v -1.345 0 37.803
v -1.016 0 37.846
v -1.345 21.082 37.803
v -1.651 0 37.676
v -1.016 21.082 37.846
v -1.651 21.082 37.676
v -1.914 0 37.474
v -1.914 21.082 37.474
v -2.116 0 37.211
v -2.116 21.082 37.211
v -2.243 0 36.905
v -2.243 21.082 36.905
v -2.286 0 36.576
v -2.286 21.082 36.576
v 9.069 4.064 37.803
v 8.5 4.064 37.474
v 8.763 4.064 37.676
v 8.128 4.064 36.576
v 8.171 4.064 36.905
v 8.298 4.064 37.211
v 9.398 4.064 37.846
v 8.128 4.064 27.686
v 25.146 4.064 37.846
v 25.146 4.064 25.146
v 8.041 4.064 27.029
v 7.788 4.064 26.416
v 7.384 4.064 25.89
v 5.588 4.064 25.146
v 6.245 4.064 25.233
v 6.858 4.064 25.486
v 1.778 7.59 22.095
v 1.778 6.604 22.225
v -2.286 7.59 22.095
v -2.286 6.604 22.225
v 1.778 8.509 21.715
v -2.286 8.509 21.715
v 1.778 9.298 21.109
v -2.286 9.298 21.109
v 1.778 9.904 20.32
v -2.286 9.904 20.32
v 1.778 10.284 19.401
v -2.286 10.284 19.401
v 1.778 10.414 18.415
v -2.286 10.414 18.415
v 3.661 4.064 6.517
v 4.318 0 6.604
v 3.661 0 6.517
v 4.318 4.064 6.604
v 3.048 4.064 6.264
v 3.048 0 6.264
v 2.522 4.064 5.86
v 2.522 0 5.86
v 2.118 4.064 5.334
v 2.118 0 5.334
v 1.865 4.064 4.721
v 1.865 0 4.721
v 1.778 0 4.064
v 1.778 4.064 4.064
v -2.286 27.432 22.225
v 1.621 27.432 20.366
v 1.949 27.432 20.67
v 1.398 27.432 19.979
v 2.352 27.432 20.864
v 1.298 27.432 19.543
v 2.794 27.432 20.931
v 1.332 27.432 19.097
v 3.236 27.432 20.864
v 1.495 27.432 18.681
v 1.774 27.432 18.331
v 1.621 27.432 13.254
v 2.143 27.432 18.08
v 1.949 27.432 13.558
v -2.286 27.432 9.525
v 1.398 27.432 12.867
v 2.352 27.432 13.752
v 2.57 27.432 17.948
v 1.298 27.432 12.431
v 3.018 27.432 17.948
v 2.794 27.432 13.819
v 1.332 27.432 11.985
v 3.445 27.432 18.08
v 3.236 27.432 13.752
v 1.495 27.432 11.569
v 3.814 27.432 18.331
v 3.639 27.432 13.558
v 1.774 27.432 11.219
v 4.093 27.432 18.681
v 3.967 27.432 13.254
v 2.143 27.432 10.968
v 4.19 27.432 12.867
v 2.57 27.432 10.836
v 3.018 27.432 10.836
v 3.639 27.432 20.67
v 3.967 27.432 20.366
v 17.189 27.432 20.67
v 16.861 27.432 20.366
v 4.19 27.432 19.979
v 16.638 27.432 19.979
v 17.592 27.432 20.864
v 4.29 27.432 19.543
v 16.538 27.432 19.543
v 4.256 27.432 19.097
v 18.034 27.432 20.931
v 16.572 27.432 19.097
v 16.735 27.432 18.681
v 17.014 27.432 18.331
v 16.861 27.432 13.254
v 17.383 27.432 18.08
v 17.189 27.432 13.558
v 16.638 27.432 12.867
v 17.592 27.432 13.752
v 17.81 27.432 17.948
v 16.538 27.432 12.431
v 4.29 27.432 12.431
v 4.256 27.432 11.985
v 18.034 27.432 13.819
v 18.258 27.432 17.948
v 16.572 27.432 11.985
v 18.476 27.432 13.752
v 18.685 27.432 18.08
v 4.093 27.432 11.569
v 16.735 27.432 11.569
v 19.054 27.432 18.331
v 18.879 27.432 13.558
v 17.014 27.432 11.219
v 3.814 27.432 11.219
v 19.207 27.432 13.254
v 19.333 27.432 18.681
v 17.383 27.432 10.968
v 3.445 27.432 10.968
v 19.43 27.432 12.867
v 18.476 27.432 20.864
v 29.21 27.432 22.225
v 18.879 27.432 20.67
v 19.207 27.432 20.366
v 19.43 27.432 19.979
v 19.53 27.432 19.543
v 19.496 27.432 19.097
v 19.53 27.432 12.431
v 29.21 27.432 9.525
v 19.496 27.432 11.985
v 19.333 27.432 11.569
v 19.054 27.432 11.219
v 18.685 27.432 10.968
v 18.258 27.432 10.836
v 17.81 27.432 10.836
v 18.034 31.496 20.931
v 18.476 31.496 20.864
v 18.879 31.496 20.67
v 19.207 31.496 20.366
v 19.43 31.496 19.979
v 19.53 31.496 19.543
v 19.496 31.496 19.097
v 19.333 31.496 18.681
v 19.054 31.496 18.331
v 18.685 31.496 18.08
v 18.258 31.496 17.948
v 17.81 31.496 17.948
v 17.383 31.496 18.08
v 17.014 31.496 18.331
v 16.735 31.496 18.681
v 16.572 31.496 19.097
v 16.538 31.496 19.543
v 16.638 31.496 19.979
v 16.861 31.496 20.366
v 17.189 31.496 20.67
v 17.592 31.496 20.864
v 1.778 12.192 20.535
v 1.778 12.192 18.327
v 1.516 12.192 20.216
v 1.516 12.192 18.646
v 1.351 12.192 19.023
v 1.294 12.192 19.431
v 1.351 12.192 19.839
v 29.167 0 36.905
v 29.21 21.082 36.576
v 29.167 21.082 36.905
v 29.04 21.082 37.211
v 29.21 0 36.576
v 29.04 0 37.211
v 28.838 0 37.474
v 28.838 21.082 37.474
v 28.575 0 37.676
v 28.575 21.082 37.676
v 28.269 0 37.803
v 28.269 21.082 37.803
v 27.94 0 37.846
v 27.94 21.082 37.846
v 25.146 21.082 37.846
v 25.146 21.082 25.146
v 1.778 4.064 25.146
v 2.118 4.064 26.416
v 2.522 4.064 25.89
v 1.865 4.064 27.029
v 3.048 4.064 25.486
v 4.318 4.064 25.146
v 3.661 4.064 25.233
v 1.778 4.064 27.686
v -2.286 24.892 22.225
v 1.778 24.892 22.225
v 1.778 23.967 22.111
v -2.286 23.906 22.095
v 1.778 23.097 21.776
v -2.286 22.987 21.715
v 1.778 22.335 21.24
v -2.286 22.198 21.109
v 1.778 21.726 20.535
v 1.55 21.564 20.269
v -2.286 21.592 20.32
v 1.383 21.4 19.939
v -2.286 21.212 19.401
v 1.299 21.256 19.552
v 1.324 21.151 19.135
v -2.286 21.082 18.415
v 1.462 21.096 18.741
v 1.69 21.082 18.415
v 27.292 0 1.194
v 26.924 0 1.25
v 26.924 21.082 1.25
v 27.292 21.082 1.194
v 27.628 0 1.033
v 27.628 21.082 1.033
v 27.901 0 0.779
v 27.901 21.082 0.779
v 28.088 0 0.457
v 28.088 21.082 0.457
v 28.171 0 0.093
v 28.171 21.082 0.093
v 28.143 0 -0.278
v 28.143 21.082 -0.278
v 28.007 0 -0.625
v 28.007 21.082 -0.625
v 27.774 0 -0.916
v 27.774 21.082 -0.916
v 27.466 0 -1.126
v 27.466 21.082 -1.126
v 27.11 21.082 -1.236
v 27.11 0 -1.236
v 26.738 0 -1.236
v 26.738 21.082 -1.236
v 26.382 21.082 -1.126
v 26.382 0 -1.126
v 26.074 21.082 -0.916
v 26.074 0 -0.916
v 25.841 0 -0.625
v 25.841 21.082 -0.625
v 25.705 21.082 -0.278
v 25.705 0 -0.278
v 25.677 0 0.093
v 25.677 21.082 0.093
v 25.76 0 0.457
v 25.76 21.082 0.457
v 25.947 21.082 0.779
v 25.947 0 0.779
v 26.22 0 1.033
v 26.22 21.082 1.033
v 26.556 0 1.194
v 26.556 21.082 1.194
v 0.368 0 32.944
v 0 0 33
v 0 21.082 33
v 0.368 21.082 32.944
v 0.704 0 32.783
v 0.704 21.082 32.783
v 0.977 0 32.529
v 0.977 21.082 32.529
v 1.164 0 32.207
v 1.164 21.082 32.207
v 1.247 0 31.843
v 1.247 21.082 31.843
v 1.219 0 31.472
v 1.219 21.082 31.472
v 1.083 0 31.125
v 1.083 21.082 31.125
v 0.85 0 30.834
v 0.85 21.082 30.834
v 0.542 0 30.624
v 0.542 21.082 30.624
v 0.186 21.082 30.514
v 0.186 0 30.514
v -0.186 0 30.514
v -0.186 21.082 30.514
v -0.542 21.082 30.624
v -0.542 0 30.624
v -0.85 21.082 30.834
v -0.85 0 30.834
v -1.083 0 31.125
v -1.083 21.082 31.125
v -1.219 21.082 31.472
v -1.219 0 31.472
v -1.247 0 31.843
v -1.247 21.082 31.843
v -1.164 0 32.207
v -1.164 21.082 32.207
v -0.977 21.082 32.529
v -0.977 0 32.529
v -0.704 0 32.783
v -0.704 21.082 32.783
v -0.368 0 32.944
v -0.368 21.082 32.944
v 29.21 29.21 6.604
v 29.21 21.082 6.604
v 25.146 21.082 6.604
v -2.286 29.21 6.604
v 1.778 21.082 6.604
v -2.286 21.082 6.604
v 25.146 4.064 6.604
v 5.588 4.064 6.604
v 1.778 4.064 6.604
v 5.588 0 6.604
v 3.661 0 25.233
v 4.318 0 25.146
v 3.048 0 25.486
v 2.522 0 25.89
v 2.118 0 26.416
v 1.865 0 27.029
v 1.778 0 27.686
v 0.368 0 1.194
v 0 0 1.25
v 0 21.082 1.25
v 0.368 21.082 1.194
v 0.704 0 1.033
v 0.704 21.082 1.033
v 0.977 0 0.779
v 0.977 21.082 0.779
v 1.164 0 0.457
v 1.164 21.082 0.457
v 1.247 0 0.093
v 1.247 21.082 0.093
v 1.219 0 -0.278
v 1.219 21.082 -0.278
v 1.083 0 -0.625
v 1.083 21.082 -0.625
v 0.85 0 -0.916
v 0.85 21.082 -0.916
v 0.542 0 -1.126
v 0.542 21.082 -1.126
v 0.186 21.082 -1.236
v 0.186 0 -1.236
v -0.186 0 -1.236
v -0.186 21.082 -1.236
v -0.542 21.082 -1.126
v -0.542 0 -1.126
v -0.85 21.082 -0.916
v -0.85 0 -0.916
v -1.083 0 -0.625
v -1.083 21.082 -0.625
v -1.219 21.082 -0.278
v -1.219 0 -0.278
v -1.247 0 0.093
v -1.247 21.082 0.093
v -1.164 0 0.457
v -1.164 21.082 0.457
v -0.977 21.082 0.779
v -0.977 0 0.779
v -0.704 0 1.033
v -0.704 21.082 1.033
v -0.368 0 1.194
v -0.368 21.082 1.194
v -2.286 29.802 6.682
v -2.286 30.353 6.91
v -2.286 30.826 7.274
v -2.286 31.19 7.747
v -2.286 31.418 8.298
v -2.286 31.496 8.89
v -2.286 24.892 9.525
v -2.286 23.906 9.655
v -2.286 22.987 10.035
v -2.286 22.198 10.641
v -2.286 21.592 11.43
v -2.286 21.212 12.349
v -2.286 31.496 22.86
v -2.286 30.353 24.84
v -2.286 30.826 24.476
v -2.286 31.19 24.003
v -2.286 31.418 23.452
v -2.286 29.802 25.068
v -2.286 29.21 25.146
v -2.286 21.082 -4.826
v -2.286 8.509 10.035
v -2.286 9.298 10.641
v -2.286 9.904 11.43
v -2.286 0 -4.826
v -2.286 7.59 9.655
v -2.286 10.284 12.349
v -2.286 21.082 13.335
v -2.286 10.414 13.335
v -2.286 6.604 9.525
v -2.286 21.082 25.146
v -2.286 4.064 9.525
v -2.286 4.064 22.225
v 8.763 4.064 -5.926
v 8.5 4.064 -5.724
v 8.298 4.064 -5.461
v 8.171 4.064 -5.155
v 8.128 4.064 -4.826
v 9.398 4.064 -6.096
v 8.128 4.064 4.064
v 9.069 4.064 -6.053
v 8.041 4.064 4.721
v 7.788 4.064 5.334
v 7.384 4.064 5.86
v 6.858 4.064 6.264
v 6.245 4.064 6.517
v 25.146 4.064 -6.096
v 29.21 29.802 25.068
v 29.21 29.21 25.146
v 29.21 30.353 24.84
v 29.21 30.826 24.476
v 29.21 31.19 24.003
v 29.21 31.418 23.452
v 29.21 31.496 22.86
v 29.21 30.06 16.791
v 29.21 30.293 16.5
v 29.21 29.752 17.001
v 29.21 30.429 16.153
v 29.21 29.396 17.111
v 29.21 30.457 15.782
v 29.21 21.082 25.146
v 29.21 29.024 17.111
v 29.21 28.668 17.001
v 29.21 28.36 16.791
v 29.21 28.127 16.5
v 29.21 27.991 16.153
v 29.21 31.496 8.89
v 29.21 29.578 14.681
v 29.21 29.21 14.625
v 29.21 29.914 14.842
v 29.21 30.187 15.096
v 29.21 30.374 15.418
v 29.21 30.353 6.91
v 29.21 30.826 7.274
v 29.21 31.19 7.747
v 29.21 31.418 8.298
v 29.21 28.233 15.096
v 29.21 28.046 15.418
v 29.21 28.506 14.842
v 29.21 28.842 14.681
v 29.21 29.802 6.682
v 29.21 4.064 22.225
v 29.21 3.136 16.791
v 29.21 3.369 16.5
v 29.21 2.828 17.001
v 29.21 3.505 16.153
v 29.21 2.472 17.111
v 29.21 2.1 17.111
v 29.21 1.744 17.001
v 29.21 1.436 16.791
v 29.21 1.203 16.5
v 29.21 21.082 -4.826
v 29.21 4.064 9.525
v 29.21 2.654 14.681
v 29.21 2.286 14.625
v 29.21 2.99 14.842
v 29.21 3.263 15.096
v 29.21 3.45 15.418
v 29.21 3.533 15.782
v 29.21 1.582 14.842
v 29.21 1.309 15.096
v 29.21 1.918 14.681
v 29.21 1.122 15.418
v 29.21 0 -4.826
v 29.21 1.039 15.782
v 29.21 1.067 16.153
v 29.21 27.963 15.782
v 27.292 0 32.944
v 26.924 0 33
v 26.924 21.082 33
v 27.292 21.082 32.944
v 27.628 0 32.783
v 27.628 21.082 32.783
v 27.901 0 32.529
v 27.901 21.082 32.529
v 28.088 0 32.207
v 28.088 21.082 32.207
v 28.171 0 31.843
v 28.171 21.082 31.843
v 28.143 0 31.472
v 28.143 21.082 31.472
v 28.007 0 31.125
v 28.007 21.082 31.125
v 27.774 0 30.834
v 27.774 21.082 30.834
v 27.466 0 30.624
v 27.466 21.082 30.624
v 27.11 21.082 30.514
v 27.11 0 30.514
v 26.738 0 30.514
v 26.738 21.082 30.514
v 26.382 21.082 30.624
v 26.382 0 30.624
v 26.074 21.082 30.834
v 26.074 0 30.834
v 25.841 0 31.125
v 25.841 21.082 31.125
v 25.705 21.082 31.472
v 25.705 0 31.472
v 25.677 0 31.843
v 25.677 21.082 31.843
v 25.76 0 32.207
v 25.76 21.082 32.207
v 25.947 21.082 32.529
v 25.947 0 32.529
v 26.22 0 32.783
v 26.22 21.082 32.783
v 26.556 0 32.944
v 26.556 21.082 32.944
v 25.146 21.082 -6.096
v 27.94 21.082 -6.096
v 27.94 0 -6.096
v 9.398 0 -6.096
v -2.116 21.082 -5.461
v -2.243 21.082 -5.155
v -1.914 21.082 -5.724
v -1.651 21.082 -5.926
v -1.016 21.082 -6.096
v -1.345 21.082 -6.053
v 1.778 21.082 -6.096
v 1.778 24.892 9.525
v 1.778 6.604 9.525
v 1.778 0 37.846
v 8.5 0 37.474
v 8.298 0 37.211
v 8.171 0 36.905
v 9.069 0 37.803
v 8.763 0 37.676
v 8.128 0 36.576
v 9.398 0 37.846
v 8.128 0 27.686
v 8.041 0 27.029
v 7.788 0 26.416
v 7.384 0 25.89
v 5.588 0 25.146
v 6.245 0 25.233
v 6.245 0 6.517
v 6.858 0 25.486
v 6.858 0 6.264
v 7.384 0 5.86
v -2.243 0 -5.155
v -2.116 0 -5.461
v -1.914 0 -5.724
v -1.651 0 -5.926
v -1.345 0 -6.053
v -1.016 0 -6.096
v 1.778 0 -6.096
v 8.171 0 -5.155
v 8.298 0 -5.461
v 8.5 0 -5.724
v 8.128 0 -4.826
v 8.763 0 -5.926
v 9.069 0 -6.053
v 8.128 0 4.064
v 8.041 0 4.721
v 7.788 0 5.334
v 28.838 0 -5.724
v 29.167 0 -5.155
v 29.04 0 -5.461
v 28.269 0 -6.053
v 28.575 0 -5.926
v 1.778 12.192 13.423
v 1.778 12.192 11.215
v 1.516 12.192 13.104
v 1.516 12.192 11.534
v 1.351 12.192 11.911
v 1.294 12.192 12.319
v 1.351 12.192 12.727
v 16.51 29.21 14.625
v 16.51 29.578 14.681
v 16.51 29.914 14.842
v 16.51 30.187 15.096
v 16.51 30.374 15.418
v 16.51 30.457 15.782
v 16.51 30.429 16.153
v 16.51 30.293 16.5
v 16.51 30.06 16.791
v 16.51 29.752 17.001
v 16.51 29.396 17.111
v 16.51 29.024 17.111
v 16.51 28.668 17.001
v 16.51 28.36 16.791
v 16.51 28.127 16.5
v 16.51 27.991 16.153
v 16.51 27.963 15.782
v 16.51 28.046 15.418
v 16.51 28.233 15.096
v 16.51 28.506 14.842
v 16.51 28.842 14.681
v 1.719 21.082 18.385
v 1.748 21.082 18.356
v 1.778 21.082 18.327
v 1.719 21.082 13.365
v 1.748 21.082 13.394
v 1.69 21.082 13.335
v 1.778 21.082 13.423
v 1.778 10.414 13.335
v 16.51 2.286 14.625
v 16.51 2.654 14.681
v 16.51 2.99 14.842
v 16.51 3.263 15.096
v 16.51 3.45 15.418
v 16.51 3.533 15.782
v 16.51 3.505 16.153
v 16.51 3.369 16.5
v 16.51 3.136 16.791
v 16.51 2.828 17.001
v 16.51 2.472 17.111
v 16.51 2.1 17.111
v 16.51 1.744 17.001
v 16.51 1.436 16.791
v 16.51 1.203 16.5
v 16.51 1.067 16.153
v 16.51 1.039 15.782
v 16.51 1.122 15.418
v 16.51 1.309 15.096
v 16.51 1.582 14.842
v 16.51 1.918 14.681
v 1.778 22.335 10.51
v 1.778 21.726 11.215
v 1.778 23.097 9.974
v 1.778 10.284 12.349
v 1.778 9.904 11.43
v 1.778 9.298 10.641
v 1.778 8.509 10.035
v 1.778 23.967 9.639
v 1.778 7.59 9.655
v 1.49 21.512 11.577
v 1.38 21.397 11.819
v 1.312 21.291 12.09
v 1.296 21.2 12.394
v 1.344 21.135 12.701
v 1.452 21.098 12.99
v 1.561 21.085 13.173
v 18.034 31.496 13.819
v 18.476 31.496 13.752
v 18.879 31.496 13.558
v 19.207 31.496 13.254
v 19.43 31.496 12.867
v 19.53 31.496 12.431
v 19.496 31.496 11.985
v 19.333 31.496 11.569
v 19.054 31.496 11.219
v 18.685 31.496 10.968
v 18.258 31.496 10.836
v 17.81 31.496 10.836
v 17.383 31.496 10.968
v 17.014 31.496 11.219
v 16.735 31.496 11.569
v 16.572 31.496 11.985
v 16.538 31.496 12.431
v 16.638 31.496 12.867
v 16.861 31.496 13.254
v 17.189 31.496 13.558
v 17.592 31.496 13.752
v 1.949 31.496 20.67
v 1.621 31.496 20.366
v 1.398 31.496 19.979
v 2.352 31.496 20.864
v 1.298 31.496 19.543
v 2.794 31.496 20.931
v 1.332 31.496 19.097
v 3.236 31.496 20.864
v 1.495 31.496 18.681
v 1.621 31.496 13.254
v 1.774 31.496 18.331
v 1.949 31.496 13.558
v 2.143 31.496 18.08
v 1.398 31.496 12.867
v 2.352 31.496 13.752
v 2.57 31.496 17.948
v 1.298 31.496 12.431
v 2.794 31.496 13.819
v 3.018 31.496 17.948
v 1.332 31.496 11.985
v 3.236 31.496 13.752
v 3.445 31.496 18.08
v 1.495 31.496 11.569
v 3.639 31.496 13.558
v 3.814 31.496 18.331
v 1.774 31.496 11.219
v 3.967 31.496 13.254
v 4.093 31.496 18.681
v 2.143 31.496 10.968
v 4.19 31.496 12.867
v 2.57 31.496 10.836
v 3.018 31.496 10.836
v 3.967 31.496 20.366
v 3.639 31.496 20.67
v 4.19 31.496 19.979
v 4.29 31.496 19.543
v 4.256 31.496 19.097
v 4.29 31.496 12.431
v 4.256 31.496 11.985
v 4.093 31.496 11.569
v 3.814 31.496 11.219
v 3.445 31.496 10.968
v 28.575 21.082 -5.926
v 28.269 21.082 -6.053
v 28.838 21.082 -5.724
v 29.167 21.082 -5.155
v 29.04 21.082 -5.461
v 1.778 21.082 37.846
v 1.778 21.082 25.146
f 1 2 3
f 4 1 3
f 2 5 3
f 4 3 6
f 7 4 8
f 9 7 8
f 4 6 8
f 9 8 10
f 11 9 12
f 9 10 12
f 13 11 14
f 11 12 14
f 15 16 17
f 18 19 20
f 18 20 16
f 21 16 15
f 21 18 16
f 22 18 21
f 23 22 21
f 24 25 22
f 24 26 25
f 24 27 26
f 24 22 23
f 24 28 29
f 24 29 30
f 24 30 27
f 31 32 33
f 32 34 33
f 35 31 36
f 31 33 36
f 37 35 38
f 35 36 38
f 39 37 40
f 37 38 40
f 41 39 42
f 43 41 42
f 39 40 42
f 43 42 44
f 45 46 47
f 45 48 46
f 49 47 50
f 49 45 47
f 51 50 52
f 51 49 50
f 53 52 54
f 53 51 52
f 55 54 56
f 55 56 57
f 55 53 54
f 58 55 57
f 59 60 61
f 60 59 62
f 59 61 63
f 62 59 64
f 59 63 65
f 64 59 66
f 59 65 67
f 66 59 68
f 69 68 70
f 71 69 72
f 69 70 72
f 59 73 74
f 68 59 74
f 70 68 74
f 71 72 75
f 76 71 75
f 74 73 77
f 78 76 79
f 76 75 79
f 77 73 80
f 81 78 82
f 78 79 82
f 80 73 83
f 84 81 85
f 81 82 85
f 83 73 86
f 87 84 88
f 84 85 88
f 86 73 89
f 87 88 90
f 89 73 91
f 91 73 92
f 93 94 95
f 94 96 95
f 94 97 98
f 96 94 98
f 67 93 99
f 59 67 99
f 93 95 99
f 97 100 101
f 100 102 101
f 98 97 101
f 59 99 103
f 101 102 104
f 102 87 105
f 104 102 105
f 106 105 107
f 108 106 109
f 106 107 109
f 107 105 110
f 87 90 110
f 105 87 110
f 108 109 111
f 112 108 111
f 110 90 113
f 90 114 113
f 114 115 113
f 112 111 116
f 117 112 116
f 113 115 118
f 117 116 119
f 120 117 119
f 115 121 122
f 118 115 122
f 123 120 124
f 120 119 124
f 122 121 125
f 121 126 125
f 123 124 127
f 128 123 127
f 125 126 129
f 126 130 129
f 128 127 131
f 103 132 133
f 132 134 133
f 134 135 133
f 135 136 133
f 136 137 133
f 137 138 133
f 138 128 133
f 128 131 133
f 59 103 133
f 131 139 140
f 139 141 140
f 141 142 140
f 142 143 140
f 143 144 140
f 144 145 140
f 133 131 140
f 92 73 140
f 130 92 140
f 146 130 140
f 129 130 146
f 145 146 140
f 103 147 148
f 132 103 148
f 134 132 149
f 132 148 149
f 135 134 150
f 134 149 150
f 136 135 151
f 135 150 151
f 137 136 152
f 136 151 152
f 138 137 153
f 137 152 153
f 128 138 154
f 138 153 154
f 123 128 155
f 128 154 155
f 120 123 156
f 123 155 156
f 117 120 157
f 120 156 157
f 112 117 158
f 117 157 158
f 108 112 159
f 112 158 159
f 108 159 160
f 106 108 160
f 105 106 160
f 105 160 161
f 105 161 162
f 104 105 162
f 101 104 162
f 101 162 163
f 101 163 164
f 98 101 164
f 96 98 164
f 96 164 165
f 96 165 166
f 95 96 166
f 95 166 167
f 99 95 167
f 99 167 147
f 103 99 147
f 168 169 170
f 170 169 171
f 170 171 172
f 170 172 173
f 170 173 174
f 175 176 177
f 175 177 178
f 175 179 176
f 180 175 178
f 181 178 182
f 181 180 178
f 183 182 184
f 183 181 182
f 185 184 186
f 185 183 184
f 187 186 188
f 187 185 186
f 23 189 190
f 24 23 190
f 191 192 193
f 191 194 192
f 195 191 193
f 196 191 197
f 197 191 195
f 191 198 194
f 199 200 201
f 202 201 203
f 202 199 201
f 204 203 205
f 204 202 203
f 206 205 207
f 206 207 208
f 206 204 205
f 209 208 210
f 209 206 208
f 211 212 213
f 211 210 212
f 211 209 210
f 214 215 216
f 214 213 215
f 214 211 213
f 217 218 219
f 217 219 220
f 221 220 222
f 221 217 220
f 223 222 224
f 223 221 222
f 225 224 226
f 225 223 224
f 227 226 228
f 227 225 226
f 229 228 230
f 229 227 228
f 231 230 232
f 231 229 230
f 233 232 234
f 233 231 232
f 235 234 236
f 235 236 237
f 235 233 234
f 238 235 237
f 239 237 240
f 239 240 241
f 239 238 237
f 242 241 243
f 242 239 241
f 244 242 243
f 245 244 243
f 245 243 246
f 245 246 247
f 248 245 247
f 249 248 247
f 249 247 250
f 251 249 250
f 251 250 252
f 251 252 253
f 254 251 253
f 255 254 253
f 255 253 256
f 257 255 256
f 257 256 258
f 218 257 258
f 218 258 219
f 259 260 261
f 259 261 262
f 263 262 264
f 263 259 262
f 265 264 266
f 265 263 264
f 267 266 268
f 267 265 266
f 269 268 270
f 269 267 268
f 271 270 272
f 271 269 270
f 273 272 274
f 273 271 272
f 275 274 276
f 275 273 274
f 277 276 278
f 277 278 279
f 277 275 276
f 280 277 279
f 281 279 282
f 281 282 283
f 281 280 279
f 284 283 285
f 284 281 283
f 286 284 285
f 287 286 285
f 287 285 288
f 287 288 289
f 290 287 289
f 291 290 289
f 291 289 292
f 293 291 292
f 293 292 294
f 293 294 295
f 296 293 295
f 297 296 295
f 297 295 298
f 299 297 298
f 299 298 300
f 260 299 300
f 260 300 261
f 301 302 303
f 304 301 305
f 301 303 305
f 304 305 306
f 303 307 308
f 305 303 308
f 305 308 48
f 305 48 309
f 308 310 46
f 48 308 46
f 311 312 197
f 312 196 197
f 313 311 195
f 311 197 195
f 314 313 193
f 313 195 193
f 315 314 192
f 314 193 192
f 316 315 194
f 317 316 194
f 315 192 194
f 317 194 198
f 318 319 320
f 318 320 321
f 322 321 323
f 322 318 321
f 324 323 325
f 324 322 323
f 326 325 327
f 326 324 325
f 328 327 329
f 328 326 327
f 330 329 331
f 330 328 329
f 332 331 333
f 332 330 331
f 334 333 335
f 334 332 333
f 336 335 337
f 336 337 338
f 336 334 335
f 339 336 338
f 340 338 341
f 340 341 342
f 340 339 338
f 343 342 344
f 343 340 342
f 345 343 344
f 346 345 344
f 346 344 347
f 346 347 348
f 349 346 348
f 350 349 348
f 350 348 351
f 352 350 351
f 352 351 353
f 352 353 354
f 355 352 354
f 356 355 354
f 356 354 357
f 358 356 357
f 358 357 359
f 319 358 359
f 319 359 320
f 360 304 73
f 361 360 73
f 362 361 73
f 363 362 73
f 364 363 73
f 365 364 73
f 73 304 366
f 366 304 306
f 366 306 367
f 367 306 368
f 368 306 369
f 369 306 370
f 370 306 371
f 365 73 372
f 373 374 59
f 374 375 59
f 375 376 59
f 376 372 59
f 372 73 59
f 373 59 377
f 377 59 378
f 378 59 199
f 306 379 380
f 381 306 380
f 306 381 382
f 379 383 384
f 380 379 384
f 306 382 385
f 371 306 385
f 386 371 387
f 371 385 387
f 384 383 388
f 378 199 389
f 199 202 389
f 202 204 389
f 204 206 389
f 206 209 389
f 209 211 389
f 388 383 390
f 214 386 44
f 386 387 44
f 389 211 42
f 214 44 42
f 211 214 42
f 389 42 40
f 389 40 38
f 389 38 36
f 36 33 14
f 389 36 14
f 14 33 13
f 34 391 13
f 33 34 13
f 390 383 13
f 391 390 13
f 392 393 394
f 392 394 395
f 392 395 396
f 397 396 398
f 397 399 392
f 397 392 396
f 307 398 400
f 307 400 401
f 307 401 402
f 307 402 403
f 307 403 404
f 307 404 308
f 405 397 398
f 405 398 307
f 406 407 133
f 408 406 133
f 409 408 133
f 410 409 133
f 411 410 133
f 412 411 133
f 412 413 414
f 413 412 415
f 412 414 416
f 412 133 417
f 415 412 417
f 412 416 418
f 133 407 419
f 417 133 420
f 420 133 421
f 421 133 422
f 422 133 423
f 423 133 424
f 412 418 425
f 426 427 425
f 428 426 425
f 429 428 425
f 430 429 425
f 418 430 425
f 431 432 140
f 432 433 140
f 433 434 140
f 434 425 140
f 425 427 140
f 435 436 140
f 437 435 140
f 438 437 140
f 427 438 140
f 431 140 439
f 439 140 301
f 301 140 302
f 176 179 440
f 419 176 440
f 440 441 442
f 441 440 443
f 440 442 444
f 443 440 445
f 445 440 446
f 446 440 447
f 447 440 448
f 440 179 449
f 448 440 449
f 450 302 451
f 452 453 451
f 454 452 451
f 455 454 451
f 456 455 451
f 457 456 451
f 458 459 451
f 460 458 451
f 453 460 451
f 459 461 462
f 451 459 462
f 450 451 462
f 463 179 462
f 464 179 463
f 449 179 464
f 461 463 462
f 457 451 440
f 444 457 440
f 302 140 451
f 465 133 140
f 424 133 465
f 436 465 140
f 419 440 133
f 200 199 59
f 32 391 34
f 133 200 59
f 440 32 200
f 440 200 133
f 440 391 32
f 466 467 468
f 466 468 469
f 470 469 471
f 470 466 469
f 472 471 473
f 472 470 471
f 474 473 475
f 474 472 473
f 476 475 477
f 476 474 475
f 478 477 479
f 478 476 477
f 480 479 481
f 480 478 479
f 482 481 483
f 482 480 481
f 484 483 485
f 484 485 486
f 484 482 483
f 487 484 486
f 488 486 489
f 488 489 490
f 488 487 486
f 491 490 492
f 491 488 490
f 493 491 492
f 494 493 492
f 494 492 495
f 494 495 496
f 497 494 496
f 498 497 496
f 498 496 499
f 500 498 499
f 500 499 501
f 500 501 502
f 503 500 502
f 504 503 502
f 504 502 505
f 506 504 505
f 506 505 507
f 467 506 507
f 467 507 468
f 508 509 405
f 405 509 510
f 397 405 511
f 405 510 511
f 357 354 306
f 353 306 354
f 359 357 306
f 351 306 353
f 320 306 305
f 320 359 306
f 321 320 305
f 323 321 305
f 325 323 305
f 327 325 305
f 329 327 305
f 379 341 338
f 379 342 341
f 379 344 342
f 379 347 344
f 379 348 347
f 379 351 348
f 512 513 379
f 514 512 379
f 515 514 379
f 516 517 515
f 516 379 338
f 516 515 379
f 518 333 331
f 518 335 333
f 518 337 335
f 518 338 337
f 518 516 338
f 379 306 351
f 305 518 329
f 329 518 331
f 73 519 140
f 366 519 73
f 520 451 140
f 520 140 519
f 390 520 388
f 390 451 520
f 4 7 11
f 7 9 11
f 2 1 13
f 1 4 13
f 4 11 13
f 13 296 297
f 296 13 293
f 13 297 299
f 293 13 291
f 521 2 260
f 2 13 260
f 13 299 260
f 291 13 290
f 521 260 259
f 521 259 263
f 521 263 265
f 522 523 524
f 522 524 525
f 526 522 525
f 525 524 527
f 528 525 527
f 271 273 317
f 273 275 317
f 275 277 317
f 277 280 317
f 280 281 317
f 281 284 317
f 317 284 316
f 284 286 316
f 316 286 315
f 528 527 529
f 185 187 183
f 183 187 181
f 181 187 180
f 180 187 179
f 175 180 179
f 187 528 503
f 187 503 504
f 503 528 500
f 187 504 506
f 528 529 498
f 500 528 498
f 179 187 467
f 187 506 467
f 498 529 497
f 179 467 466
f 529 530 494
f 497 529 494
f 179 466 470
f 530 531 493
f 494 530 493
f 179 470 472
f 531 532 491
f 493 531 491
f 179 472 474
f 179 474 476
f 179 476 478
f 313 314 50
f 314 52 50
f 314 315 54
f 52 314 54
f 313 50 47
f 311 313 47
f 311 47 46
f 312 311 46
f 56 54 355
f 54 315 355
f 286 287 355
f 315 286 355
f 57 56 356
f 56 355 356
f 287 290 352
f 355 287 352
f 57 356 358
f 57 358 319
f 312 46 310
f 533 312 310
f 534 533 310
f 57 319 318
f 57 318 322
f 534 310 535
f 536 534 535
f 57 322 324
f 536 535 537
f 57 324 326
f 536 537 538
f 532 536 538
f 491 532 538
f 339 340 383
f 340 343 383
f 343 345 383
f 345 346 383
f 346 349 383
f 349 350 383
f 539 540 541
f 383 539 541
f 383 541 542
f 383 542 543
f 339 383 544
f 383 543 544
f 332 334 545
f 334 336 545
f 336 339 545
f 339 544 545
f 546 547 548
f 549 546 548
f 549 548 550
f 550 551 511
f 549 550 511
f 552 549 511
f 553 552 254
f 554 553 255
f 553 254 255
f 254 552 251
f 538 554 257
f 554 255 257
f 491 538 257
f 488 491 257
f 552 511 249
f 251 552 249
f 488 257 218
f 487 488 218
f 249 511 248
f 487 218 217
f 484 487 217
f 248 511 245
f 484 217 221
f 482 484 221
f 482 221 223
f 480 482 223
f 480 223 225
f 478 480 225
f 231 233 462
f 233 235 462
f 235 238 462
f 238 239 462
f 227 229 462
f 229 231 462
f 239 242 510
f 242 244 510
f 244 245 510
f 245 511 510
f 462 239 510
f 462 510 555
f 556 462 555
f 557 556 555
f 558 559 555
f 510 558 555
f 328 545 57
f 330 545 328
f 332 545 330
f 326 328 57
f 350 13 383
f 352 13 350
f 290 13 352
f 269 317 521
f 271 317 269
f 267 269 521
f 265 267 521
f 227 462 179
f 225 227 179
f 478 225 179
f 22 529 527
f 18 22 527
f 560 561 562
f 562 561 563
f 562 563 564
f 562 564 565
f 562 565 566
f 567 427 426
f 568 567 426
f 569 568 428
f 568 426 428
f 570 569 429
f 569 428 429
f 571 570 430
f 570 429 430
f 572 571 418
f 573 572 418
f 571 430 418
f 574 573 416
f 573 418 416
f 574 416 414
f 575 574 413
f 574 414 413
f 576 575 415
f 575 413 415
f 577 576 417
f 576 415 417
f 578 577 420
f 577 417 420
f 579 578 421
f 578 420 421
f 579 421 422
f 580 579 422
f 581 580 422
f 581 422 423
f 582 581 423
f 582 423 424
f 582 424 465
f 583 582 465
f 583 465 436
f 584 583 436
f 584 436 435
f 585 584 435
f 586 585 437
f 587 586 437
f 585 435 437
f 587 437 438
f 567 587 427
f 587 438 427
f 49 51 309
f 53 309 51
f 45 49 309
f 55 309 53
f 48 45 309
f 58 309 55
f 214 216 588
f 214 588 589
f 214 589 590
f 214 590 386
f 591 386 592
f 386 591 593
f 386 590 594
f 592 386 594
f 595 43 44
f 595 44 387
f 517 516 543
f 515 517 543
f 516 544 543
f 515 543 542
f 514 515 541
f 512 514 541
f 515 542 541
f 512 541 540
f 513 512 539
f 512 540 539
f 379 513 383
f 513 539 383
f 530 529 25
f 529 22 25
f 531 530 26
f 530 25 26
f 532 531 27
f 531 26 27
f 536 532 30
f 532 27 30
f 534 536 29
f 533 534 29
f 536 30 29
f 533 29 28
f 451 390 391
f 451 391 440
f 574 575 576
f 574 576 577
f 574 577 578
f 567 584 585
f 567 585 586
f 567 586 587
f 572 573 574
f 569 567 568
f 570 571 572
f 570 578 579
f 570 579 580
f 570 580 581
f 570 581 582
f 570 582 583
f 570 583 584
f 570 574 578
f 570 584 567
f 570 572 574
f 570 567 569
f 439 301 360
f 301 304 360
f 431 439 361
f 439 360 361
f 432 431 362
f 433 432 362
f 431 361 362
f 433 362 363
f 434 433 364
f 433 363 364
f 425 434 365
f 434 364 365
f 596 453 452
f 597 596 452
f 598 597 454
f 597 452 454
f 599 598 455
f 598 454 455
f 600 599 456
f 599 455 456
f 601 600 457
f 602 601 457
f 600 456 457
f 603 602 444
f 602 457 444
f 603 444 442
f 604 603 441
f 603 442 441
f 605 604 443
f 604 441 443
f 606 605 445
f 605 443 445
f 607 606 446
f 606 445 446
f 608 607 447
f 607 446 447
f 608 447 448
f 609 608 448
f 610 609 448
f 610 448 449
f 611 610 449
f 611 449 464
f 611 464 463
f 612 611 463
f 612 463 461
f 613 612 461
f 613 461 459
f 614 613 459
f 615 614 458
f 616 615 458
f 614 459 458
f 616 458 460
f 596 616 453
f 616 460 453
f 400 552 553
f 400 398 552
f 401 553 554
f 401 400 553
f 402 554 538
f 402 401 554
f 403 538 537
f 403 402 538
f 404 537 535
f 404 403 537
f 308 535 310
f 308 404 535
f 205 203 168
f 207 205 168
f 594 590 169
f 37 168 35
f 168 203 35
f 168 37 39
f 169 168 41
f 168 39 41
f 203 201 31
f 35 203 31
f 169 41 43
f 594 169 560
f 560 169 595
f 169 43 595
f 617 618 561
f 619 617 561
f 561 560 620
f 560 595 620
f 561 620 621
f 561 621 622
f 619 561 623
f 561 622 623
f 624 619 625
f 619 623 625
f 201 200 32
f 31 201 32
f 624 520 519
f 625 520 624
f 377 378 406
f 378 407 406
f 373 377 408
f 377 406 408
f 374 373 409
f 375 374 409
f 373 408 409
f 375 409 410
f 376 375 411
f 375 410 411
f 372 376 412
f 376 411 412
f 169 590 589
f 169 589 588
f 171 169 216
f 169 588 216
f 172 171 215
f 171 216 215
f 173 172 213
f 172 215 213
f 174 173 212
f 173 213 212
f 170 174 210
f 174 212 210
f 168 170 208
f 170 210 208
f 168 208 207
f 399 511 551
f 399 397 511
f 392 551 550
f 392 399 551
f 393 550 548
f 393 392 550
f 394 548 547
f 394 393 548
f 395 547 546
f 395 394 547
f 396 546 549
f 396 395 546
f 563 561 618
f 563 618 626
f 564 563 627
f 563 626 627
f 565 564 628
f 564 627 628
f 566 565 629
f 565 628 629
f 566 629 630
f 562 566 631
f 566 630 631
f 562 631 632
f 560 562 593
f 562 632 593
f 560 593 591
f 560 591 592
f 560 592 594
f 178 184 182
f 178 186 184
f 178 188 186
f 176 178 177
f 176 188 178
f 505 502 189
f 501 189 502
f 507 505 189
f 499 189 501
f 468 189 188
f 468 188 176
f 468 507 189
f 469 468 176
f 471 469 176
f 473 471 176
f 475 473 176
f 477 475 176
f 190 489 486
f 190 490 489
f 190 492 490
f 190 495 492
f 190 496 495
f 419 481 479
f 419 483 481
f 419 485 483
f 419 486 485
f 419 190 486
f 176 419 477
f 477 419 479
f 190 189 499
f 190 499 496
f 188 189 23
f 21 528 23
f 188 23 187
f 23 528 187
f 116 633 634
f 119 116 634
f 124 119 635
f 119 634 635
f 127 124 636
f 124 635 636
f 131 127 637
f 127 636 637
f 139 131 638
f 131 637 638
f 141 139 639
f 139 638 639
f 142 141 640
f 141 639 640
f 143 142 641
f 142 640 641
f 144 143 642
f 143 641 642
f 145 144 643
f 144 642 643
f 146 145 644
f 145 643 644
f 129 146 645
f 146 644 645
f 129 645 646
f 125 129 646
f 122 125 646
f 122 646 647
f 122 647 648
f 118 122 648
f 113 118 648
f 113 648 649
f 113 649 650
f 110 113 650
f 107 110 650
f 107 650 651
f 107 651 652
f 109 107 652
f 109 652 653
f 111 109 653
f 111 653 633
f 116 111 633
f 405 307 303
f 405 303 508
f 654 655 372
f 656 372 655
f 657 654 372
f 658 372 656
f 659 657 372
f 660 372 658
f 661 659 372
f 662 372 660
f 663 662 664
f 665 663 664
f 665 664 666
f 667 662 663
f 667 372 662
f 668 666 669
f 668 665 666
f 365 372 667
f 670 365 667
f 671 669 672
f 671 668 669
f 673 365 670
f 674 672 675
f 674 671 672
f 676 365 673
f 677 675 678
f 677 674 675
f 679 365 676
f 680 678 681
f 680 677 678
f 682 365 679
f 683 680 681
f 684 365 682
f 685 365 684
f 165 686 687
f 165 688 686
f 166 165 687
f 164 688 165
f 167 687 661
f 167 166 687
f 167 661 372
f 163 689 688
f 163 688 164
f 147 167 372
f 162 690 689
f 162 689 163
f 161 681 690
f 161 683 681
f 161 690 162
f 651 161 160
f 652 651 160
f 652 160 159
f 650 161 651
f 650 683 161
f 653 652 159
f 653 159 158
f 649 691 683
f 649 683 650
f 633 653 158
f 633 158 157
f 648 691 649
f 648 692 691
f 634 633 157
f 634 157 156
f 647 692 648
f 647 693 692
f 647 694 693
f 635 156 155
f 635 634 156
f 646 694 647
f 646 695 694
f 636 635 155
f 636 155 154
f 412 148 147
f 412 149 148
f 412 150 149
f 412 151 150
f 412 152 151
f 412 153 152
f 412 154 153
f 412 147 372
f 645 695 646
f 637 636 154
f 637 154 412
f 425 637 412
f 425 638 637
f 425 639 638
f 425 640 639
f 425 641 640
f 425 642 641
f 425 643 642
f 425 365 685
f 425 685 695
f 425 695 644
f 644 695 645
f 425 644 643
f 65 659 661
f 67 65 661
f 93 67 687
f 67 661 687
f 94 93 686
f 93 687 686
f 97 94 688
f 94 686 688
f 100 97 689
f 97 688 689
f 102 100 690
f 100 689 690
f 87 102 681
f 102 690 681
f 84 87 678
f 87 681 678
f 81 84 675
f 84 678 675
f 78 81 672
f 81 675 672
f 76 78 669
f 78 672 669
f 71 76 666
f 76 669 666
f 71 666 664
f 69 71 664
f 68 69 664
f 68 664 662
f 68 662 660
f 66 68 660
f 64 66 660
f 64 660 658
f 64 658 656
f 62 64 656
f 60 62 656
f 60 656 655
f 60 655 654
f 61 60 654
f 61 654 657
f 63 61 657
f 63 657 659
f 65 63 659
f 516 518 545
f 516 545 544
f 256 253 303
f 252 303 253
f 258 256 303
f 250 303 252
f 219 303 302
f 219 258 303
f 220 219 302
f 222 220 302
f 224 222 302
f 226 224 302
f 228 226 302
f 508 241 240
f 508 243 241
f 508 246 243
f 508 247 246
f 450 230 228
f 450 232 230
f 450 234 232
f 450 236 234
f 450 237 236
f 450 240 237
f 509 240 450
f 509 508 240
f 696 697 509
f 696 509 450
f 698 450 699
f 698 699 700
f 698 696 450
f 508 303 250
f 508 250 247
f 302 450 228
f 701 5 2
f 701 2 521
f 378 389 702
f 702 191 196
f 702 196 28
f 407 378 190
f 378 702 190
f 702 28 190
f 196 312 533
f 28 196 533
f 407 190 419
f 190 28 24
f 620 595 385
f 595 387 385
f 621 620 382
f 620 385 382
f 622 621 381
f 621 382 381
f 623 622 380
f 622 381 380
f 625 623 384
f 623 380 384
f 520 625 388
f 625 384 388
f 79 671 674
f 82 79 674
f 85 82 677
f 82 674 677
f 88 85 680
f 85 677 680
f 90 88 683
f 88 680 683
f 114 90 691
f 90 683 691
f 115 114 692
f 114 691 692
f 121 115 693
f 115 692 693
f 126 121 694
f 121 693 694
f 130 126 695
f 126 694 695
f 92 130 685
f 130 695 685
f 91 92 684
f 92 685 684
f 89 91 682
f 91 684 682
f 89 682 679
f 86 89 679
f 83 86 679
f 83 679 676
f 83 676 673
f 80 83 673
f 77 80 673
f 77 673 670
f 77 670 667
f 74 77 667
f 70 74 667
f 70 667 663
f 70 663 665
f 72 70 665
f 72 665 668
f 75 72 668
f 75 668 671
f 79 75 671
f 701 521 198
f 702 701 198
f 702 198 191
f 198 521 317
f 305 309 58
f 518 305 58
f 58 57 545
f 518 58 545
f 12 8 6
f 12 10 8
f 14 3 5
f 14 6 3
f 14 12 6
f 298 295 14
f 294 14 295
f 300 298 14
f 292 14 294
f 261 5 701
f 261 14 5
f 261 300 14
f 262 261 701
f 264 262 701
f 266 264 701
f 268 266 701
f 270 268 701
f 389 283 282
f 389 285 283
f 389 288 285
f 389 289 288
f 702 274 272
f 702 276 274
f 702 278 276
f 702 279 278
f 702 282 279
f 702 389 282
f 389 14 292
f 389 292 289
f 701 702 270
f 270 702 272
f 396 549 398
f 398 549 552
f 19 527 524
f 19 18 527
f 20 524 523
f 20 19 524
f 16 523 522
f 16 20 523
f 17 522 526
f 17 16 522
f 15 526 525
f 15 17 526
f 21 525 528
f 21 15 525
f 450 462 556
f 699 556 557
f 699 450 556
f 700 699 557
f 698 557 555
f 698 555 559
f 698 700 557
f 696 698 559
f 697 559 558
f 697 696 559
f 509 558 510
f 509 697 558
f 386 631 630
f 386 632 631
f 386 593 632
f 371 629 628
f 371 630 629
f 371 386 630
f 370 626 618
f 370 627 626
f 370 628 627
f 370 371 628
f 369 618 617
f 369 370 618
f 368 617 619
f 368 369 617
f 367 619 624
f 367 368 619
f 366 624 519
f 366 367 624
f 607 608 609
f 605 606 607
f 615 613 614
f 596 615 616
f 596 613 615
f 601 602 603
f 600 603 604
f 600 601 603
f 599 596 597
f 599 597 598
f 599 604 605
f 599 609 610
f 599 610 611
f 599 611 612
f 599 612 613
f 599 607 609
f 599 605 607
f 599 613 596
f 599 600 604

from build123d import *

# Parameters (mm, degrees)
SKETCH1_R           = 1.25
BOSS_EXTRUDE1_DEPTH = 4.064
FILLET1_R           = 2.54
SKETCH1_5_W         = 4.064
SKETCH1_5_H         = 12.7
SKETCH1_5_R         = 1.25
SKETCH1_5_H_2       = 2.921
BOSS_EXTRUDE2_DEPTH = 21.082
SKETCH1_7_W         = 4.064
SKETCH1_7_H         = 2.921
SKETCH1_7_W_2       = 23.368
SKETCH1_7_H_2       = 12.7
BOSS_EXTRUDE3_DEPTH = 31.496
SKETCH1_9_W         = 23.368
SKETCH1_9_H         = 12.7
SKETCH1_9_W_2       = 4.064
CUT_EXTRUDE1_DEPTH  = 27.432
SKETCH1_10_W        = 23.368
SKETCH1_10_H        = 12.7
SKETCH1_10_W_2      = 4.064
BOSS_EXTRUDE4_DEPTH = 4.064
SKETCH2_R           = 1.25
CUT_EXTRUDE2_DEPTH  = 12.7
SKETCH2_3_W         = 12.7
SKETCH2_3_H         = 6.35
CUT_EXTRUDE3_DEPTH  = 40.132
FILLET2_R           = 3.81
FILLET3_R           = 1.27
SKETCH3_R           = 1.5
CUT_EXTRUDE4_DEPTH  = 19.304
FILLET4_R           = 2.286


with BuildPart() as part:
    # Sketch1 → Boss-Extrude1 (new body)
    with BuildSketch(Plane(origin=(0, 0, 0), x_dir=(1, 0, 0), z_dir=(0, 1, 0))):
        Polygon((29.21, 6.096), (8.128, 6.096), (8.128, -6.604), (1.778, -6.604), (1.778, 6.096), (-2.286, 6.096), (-2.286, -37.846), (1.778, -37.846), (1.778, -25.146), (8.128, -25.146), (8.128, -37.846), (29.21, -37.846), align=None)
        with Locations(Location((26.924, 0, 0), (0, 0, 270))):
            Circle(SKETCH1_R, mode=Mode.SUBTRACT)
        with Locations(Location((0, 0, 0), (0, 0, 270))):
            Circle(SKETCH1_R, mode=Mode.SUBTRACT)
        with Locations(Location((26.924, -31.75, 0), (0, 0, 270))):
            Circle(SKETCH1_R, mode=Mode.SUBTRACT)
        with Locations(Location((0, -31.75, 0), (0, 0, 270))):
            Circle(SKETCH1_R, mode=Mode.SUBTRACT)
    extrude(amount=BOSS_EXTRUDE1_DEPTH)

    # Fillet1
    fillet1_edges = [part.edges().sort_by_distance(p)[0] for p in [
        (8.128, 2.032, 25.146),
        (1.778, 2.032, 25.146),
        (1.778, 2.032, 6.604),
        (8.128, 2.032, 6.604),
    ]]
    fillet(fillet1_edges, radius=FILLET1_R)

    # Sketch1<5> → Boss-Extrude2 (add)
    # profile 1 of 9: a face of its own
    with BuildSketch(Plane(origin=(0, 0, 0), x_dir=(1, 0, 0), z_dir=(0, 1, 0))):
        Polygon((1.778, -22.225), (1.778, -9.525), (1.778, -6.604), (-2.286, -6.604), (-2.286, -25.146), (1.778, -25.146), align=None)
    # profile 2 of 9: a face of its own
    with BuildSketch(Plane(origin=(0, 0, 0), x_dir=(1, 0, 0), z_dir=(0, 1, 0))):
        with Locations((-0.254, -31.496)):
            Rectangle(SKETCH1_5_W, SKETCH1_5_H)
        with Locations(Location((0, -31.75, 0), (0, 0, 270))):
            Circle(SKETCH1_5_R, mode=Mode.SUBTRACT)
    # profile 3 of 9: a face of its own
    with BuildSketch(Plane(origin=(0, 0, 0), x_dir=(1, 0, 0), z_dir=(0, 1, 0))):
        with Locations((-0.254, -0.254)):
            Rectangle(SKETCH1_5_W, SKETCH1_5_H)
        with Locations(Location((0, 0, 0), (0, 0, 270))):
            Circle(SKETCH1_5_R, mode=Mode.SUBTRACT)
    # profile 4 of 9: a face of its own
    with BuildSketch(Plane(origin=(0, 0, 0), x_dir=(1, 0, 0), z_dir=(0, 1, 0))):
        Polygon((25.146, -25.146), (25.146, -22.225), (1.778, -22.225), (1.778, -25.146), (8.128, -25.146), align=None)
    # profile 5 of 9: a face of its own
    with BuildSketch(Plane(origin=(0, 0, 0), x_dir=(1, 0, 0), z_dir=(0, 1, 0))):
        Polygon((25.146, -9.525), (25.146, -6.604), (8.128, -6.604), (1.778, -6.604), (1.778, -9.525), align=None)
    # profile 6 of 9: a face of its own
    with BuildSketch(Plane(origin=(0, 0, 0), x_dir=(1, 0, 0), z_dir=(0, 1, 0))):
        with Locations((27.178, -8.0645)):
            Rectangle(SKETCH1_5_W, SKETCH1_5_H_2)
    # profile 7 of 9: a face of its own
    with BuildSketch(Plane(origin=(0, 0, 0), x_dir=(1, 0, 0), z_dir=(0, 1, 0))):
        with Locations((27.178, -23.6855)):
            Rectangle(SKETCH1_5_W, SKETCH1_5_H_2)
    # profile 8 of 9: a face of its own
    with BuildSketch(Plane(origin=(0, 0, 0), x_dir=(1, 0, 0), z_dir=(0, 1, 0))):
        with Locations((27.178, -31.496)):
            Rectangle(SKETCH1_5_W, SKETCH1_5_H)
        with Locations(Location((26.924, -31.75, 0), (0, 0, 270))):
            Circle(SKETCH1_5_R, mode=Mode.SUBTRACT)
    # profile 9 of 9: a face of its own
    with BuildSketch(Plane(origin=(0, 0, 0), x_dir=(1, 0, 0), z_dir=(0, 1, 0))):
        with Locations((27.178, -0.254)):
            Rectangle(SKETCH1_5_W, SKETCH1_5_H)
        with Locations(Location((26.924, 0, 0), (0, 0, 270))):
            Circle(SKETCH1_5_R, mode=Mode.SUBTRACT)
    extrude(amount=BOSS_EXTRUDE2_DEPTH)

    # Sketch1<7> → Boss-Extrude3 (add)
    with BuildSketch(Plane(origin=(0, 0, 0), x_dir=(1, 0, 0), z_dir=(0, 1, 0))):
        with Locations((27.178, -8.0645)):
            Rectangle(SKETCH1_7_W, SKETCH1_7_H)
        Polygon((25.146, -9.525), (25.146, -6.604), (8.128, -6.604), (1.778, -6.604), (1.778, -9.525), align=None)
        with Locations((27.178, -23.6855)):
            Rectangle(SKETCH1_7_W, SKETCH1_7_H)
        with Locations((13.462, -15.875)):
            Rectangle(SKETCH1_7_W_2, SKETCH1_7_H_2)
        with Locations((27.178, -15.875)):
            Rectangle(SKETCH1_7_W, SKETCH1_7_H_2)
        Polygon((25.146, -25.146), (25.146, -22.225), (1.778, -22.225), (1.778, -25.146), (8.128, -25.146), align=None)
        Polygon((1.778, -22.225), (1.778, -9.525), (1.778, -6.604), (-2.286, -6.604), (-2.286, -25.146), (1.778, -25.146), align=None)
    extrude(amount=BOSS_EXTRUDE3_DEPTH)

    # Sketch1<9> → Cut-Extrude1 (cut)
    with BuildSketch(Plane(origin=(0, 0, 0), x_dir=(1, 0, 0), z_dir=(0, 1, 0))):
        with Locations((13.462, -15.875)):
            Rectangle(SKETCH1_9_W, SKETCH1_9_H)
        with Locations((27.178, -15.875)):
            Rectangle(SKETCH1_9_W_2, SKETCH1_9_H)
    extrude(amount=CUT_EXTRUDE1_DEPTH, mode=Mode.SUBTRACT)

    # Sketch1<10> → Boss-Extrude4 (add)
    with BuildSketch(Plane(origin=(0, 0, 0), x_dir=(1, 0, 0), z_dir=(0, 1, 0))):
        with Locations((13.462, -15.875)):
            Rectangle(SKETCH1_10_W, SKETCH1_10_H)
        with Locations((27.178, -15.875)):
            Rectangle(SKETCH1_10_W_2, SKETCH1_10_H)
    extrude(amount=BOSS_EXTRUDE4_DEPTH)

    # Sketch2 → Cut-Extrude2 (cut)
    with BuildSketch(Plane(origin=(29.21, 0, 0), x_dir=(0, 0, -1), z_dir=(1, 0, 0))):
        with Locations((-15.875, 29.21)):
            Circle(SKETCH2_R)
        with Locations((-15.875, 2.286)):
            Circle(SKETCH2_R)
    extrude(amount=-CUT_EXTRUDE2_DEPTH, mode=Mode.SUBTRACT)

    # Sketch2<3> → Cut-Extrude3 (cut)
    with BuildSketch(Plane(origin=(29.21, 0, 0), x_dir=(0, 0, -1), z_dir=(1, 0, 0))):
        with Locations((-15.875, 24.257)):
            Rectangle(SKETCH2_3_W, SKETCH2_3_H)
        with Locations((-15.875, 7.239)):
            Rectangle(SKETCH2_3_W, SKETCH2_3_H)
    extrude(amount=-CUT_EXTRUDE3_DEPTH, mode=Mode.SUBTRACT)

    # Fillet2
    fillet2_edges = [part.edges().sort_by_distance(p)[0] for p in [
        (-0.254, 21.082, 9.525),
        (-0.254, 21.082, 22.225),
        (-0.254, 10.414, 22.225),
        (-0.254, 10.414, 9.525),
    ]]
    fillet(fillet2_edges, radius=FILLET2_R)

    # Fillet3
    fillet3_edges = [part.edges().sort_by_distance(p)[0] for p in [
        (29.21, 10.541, 37.846),
        (8.128, 2.032, 37.846),
        (-2.286, 10.541, 37.846),
        (-2.286, 10.541, -6.096),
        (8.128, 2.032, -6.096),
        (29.21, 10.541, -6.096),
    ]]
    fillet(fillet3_edges, radius=FILLET3_R)

    # Sketch3 → Cut-Extrude4 (cut)
    with BuildSketch(Plane(origin=(0, 31.496, 0), x_dir=(1, 0, 0), z_dir=(0, 1, 0))):
        with Locations(Location((2.794, -12.319, 0), (0, 0, 270))):
            Circle(SKETCH3_R)
        with Locations(Location((18.034, -12.319, 0), (0, 0, 270))):
            Circle(SKETCH3_R)
        with Locations(Location((2.794, -19.431, 0), (0, 0, 270))):
            Circle(SKETCH3_R)
        with Locations(Location((18.034, -19.431, 0), (0, 0, 270))):
            Circle(SKETCH3_R)
    extrude(amount=-CUT_EXTRUDE4_DEPTH, mode=Mode.SUBTRACT)

    # Fillet4
    fillet4_edges = [part.edges().sort_by_distance(p)[0] for p in [
        (13.462, 31.496, 6.604),
        (13.462, 31.496, 25.146),
    ]]
    fillet(fillet4_edges, radius=FILLET4_R)


solid = part.part
